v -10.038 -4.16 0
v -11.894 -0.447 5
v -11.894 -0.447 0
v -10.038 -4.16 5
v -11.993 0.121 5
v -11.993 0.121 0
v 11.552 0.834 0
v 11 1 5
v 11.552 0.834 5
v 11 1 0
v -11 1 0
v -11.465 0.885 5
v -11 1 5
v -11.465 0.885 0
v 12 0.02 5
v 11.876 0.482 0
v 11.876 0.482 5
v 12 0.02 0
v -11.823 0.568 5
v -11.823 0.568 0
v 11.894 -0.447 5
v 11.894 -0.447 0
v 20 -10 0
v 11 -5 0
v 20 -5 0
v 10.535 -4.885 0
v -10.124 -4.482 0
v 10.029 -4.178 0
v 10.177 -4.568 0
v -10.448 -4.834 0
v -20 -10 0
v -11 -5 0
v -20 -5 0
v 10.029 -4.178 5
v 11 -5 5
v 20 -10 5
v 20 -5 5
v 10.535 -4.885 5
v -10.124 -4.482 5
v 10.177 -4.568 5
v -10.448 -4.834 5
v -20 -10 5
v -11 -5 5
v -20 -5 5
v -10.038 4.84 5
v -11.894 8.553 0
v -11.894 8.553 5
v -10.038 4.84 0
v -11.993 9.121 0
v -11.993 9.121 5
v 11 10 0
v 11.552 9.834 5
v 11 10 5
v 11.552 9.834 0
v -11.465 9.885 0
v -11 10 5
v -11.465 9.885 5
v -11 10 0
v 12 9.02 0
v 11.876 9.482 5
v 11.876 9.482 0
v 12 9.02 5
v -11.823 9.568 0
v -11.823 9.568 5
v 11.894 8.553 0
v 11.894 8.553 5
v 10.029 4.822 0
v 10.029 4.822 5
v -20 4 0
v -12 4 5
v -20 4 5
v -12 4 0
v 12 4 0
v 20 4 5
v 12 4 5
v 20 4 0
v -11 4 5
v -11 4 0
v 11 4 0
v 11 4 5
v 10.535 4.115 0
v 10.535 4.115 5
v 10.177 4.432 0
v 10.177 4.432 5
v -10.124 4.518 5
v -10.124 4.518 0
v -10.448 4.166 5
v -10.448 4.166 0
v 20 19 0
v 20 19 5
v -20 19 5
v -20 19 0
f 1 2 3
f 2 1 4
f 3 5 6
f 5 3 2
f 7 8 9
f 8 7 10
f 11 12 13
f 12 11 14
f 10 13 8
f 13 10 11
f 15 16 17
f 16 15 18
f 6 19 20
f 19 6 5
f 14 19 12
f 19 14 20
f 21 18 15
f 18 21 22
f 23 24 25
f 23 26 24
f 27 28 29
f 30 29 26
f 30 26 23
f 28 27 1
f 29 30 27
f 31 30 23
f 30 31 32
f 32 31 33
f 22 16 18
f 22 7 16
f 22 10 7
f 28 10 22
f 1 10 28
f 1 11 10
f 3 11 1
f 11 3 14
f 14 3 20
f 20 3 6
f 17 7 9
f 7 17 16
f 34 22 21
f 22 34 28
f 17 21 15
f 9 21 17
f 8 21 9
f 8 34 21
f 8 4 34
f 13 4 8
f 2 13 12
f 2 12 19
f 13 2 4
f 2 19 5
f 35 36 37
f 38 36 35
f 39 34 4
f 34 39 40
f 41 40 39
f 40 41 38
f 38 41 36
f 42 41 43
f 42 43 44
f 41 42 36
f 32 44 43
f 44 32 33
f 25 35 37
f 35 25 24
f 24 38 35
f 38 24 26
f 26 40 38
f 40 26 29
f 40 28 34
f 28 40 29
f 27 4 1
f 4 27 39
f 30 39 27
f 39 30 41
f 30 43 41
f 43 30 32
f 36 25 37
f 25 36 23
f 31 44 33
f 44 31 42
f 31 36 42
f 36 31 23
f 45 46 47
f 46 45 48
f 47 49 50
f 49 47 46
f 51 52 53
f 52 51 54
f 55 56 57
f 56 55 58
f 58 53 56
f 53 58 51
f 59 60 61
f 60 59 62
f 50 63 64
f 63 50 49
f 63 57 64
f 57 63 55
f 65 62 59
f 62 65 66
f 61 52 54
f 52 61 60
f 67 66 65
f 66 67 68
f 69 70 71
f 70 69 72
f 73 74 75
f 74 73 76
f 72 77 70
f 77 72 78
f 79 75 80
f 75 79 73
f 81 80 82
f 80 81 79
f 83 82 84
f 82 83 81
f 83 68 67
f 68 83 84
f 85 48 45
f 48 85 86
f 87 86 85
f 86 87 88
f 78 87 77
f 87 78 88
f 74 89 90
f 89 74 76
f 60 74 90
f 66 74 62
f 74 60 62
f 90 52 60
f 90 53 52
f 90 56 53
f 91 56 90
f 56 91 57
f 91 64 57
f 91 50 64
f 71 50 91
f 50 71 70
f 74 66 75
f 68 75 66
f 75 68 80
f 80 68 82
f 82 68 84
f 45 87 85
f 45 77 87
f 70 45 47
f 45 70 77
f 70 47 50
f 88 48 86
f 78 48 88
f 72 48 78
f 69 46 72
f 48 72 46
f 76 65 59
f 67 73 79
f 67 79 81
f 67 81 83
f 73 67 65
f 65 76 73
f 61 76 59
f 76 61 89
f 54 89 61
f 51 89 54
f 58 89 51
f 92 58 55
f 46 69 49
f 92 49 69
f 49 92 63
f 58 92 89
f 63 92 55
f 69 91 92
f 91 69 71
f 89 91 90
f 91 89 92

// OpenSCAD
// @copyright  Chris Kush 2019
// @file       dovetail.scad
// @source     https://github.com/chriskush/hypotrochoids/blob/main/dovetail.scad
// @license    http://creativecommons.org/licenses/LGPL/2.1/
// @license    http://creativecommons.org/licenses/by-sa/3.0//
// @brief      Snap-together tabs-and-slots for parts too big to print.

module dovetail(neck, tail, depth, thickness, sense) {
  // neck - narrow end of 'tail
  // tail - wide end of 'tail
  // depth - distance from neck to tail
  // thickness - thickness (in Z) of 'tail
  // sense - positive (male) or negative (female)
  //   'Positive tails get unioned
  //   'Negative tails get differenced
  offset = depth / 4;
  thickener = sense ? 0 : thickness * 0.04;
  neck_sink = offset; //depth * 0.05;
  union() {
    neck_m = neck - offset * 2;
    neck_f = neck + offset * 2;
    tail_m = tail - offset * 2;
    tail_f = tail + offset * 2;
    translate([0, neck_sink, -thickener / 2])
      linear_extrude(height = thickness + thickener)
        offset(r=offset)
          polygon([ [tail_m / 2, depth], [-tail_m / 2, depth],
                    [-neck_m / 2, 0], [neck_m / 2, 0] ]);
    translate([0, neck_sink, -thickener / 2])
      linear_extrude(height = thickness + thickener)
        offset(r=-offset)
          polygon([ [tail_f / 2, depth], [-tail_f / 2, depth],
                    [-neck_f / 2, 0],
                    [-tail_f / 2, 0],
                    [-tail_f / 2, -depth],
                    [ tail_f / 2, -depth],
                    [ tail_f / 2, 0],
                    [ neck_f / 2, 0],
                    ]);
  }
}

dovetail_example();

$fs = 0.5;

module dovetail_example() {
  thickness=5;
  // Yang
  translate([-20, -10]) {
    union() {
      cube([40, 5, thickness]);
      translate([20, 5])
        dovetail(neck=20, tail=24, depth=4, thickness=thickness, sense=true);
    }
  }
  // Yin
  translate([-20, 4]) {
    difference() {
      cube([40, 15, thickness]);
      translate([20, 0])
        dovetail(neck=20, tail=24, depth=4, thickness=thickness, sense=false);
    }
  }
}
